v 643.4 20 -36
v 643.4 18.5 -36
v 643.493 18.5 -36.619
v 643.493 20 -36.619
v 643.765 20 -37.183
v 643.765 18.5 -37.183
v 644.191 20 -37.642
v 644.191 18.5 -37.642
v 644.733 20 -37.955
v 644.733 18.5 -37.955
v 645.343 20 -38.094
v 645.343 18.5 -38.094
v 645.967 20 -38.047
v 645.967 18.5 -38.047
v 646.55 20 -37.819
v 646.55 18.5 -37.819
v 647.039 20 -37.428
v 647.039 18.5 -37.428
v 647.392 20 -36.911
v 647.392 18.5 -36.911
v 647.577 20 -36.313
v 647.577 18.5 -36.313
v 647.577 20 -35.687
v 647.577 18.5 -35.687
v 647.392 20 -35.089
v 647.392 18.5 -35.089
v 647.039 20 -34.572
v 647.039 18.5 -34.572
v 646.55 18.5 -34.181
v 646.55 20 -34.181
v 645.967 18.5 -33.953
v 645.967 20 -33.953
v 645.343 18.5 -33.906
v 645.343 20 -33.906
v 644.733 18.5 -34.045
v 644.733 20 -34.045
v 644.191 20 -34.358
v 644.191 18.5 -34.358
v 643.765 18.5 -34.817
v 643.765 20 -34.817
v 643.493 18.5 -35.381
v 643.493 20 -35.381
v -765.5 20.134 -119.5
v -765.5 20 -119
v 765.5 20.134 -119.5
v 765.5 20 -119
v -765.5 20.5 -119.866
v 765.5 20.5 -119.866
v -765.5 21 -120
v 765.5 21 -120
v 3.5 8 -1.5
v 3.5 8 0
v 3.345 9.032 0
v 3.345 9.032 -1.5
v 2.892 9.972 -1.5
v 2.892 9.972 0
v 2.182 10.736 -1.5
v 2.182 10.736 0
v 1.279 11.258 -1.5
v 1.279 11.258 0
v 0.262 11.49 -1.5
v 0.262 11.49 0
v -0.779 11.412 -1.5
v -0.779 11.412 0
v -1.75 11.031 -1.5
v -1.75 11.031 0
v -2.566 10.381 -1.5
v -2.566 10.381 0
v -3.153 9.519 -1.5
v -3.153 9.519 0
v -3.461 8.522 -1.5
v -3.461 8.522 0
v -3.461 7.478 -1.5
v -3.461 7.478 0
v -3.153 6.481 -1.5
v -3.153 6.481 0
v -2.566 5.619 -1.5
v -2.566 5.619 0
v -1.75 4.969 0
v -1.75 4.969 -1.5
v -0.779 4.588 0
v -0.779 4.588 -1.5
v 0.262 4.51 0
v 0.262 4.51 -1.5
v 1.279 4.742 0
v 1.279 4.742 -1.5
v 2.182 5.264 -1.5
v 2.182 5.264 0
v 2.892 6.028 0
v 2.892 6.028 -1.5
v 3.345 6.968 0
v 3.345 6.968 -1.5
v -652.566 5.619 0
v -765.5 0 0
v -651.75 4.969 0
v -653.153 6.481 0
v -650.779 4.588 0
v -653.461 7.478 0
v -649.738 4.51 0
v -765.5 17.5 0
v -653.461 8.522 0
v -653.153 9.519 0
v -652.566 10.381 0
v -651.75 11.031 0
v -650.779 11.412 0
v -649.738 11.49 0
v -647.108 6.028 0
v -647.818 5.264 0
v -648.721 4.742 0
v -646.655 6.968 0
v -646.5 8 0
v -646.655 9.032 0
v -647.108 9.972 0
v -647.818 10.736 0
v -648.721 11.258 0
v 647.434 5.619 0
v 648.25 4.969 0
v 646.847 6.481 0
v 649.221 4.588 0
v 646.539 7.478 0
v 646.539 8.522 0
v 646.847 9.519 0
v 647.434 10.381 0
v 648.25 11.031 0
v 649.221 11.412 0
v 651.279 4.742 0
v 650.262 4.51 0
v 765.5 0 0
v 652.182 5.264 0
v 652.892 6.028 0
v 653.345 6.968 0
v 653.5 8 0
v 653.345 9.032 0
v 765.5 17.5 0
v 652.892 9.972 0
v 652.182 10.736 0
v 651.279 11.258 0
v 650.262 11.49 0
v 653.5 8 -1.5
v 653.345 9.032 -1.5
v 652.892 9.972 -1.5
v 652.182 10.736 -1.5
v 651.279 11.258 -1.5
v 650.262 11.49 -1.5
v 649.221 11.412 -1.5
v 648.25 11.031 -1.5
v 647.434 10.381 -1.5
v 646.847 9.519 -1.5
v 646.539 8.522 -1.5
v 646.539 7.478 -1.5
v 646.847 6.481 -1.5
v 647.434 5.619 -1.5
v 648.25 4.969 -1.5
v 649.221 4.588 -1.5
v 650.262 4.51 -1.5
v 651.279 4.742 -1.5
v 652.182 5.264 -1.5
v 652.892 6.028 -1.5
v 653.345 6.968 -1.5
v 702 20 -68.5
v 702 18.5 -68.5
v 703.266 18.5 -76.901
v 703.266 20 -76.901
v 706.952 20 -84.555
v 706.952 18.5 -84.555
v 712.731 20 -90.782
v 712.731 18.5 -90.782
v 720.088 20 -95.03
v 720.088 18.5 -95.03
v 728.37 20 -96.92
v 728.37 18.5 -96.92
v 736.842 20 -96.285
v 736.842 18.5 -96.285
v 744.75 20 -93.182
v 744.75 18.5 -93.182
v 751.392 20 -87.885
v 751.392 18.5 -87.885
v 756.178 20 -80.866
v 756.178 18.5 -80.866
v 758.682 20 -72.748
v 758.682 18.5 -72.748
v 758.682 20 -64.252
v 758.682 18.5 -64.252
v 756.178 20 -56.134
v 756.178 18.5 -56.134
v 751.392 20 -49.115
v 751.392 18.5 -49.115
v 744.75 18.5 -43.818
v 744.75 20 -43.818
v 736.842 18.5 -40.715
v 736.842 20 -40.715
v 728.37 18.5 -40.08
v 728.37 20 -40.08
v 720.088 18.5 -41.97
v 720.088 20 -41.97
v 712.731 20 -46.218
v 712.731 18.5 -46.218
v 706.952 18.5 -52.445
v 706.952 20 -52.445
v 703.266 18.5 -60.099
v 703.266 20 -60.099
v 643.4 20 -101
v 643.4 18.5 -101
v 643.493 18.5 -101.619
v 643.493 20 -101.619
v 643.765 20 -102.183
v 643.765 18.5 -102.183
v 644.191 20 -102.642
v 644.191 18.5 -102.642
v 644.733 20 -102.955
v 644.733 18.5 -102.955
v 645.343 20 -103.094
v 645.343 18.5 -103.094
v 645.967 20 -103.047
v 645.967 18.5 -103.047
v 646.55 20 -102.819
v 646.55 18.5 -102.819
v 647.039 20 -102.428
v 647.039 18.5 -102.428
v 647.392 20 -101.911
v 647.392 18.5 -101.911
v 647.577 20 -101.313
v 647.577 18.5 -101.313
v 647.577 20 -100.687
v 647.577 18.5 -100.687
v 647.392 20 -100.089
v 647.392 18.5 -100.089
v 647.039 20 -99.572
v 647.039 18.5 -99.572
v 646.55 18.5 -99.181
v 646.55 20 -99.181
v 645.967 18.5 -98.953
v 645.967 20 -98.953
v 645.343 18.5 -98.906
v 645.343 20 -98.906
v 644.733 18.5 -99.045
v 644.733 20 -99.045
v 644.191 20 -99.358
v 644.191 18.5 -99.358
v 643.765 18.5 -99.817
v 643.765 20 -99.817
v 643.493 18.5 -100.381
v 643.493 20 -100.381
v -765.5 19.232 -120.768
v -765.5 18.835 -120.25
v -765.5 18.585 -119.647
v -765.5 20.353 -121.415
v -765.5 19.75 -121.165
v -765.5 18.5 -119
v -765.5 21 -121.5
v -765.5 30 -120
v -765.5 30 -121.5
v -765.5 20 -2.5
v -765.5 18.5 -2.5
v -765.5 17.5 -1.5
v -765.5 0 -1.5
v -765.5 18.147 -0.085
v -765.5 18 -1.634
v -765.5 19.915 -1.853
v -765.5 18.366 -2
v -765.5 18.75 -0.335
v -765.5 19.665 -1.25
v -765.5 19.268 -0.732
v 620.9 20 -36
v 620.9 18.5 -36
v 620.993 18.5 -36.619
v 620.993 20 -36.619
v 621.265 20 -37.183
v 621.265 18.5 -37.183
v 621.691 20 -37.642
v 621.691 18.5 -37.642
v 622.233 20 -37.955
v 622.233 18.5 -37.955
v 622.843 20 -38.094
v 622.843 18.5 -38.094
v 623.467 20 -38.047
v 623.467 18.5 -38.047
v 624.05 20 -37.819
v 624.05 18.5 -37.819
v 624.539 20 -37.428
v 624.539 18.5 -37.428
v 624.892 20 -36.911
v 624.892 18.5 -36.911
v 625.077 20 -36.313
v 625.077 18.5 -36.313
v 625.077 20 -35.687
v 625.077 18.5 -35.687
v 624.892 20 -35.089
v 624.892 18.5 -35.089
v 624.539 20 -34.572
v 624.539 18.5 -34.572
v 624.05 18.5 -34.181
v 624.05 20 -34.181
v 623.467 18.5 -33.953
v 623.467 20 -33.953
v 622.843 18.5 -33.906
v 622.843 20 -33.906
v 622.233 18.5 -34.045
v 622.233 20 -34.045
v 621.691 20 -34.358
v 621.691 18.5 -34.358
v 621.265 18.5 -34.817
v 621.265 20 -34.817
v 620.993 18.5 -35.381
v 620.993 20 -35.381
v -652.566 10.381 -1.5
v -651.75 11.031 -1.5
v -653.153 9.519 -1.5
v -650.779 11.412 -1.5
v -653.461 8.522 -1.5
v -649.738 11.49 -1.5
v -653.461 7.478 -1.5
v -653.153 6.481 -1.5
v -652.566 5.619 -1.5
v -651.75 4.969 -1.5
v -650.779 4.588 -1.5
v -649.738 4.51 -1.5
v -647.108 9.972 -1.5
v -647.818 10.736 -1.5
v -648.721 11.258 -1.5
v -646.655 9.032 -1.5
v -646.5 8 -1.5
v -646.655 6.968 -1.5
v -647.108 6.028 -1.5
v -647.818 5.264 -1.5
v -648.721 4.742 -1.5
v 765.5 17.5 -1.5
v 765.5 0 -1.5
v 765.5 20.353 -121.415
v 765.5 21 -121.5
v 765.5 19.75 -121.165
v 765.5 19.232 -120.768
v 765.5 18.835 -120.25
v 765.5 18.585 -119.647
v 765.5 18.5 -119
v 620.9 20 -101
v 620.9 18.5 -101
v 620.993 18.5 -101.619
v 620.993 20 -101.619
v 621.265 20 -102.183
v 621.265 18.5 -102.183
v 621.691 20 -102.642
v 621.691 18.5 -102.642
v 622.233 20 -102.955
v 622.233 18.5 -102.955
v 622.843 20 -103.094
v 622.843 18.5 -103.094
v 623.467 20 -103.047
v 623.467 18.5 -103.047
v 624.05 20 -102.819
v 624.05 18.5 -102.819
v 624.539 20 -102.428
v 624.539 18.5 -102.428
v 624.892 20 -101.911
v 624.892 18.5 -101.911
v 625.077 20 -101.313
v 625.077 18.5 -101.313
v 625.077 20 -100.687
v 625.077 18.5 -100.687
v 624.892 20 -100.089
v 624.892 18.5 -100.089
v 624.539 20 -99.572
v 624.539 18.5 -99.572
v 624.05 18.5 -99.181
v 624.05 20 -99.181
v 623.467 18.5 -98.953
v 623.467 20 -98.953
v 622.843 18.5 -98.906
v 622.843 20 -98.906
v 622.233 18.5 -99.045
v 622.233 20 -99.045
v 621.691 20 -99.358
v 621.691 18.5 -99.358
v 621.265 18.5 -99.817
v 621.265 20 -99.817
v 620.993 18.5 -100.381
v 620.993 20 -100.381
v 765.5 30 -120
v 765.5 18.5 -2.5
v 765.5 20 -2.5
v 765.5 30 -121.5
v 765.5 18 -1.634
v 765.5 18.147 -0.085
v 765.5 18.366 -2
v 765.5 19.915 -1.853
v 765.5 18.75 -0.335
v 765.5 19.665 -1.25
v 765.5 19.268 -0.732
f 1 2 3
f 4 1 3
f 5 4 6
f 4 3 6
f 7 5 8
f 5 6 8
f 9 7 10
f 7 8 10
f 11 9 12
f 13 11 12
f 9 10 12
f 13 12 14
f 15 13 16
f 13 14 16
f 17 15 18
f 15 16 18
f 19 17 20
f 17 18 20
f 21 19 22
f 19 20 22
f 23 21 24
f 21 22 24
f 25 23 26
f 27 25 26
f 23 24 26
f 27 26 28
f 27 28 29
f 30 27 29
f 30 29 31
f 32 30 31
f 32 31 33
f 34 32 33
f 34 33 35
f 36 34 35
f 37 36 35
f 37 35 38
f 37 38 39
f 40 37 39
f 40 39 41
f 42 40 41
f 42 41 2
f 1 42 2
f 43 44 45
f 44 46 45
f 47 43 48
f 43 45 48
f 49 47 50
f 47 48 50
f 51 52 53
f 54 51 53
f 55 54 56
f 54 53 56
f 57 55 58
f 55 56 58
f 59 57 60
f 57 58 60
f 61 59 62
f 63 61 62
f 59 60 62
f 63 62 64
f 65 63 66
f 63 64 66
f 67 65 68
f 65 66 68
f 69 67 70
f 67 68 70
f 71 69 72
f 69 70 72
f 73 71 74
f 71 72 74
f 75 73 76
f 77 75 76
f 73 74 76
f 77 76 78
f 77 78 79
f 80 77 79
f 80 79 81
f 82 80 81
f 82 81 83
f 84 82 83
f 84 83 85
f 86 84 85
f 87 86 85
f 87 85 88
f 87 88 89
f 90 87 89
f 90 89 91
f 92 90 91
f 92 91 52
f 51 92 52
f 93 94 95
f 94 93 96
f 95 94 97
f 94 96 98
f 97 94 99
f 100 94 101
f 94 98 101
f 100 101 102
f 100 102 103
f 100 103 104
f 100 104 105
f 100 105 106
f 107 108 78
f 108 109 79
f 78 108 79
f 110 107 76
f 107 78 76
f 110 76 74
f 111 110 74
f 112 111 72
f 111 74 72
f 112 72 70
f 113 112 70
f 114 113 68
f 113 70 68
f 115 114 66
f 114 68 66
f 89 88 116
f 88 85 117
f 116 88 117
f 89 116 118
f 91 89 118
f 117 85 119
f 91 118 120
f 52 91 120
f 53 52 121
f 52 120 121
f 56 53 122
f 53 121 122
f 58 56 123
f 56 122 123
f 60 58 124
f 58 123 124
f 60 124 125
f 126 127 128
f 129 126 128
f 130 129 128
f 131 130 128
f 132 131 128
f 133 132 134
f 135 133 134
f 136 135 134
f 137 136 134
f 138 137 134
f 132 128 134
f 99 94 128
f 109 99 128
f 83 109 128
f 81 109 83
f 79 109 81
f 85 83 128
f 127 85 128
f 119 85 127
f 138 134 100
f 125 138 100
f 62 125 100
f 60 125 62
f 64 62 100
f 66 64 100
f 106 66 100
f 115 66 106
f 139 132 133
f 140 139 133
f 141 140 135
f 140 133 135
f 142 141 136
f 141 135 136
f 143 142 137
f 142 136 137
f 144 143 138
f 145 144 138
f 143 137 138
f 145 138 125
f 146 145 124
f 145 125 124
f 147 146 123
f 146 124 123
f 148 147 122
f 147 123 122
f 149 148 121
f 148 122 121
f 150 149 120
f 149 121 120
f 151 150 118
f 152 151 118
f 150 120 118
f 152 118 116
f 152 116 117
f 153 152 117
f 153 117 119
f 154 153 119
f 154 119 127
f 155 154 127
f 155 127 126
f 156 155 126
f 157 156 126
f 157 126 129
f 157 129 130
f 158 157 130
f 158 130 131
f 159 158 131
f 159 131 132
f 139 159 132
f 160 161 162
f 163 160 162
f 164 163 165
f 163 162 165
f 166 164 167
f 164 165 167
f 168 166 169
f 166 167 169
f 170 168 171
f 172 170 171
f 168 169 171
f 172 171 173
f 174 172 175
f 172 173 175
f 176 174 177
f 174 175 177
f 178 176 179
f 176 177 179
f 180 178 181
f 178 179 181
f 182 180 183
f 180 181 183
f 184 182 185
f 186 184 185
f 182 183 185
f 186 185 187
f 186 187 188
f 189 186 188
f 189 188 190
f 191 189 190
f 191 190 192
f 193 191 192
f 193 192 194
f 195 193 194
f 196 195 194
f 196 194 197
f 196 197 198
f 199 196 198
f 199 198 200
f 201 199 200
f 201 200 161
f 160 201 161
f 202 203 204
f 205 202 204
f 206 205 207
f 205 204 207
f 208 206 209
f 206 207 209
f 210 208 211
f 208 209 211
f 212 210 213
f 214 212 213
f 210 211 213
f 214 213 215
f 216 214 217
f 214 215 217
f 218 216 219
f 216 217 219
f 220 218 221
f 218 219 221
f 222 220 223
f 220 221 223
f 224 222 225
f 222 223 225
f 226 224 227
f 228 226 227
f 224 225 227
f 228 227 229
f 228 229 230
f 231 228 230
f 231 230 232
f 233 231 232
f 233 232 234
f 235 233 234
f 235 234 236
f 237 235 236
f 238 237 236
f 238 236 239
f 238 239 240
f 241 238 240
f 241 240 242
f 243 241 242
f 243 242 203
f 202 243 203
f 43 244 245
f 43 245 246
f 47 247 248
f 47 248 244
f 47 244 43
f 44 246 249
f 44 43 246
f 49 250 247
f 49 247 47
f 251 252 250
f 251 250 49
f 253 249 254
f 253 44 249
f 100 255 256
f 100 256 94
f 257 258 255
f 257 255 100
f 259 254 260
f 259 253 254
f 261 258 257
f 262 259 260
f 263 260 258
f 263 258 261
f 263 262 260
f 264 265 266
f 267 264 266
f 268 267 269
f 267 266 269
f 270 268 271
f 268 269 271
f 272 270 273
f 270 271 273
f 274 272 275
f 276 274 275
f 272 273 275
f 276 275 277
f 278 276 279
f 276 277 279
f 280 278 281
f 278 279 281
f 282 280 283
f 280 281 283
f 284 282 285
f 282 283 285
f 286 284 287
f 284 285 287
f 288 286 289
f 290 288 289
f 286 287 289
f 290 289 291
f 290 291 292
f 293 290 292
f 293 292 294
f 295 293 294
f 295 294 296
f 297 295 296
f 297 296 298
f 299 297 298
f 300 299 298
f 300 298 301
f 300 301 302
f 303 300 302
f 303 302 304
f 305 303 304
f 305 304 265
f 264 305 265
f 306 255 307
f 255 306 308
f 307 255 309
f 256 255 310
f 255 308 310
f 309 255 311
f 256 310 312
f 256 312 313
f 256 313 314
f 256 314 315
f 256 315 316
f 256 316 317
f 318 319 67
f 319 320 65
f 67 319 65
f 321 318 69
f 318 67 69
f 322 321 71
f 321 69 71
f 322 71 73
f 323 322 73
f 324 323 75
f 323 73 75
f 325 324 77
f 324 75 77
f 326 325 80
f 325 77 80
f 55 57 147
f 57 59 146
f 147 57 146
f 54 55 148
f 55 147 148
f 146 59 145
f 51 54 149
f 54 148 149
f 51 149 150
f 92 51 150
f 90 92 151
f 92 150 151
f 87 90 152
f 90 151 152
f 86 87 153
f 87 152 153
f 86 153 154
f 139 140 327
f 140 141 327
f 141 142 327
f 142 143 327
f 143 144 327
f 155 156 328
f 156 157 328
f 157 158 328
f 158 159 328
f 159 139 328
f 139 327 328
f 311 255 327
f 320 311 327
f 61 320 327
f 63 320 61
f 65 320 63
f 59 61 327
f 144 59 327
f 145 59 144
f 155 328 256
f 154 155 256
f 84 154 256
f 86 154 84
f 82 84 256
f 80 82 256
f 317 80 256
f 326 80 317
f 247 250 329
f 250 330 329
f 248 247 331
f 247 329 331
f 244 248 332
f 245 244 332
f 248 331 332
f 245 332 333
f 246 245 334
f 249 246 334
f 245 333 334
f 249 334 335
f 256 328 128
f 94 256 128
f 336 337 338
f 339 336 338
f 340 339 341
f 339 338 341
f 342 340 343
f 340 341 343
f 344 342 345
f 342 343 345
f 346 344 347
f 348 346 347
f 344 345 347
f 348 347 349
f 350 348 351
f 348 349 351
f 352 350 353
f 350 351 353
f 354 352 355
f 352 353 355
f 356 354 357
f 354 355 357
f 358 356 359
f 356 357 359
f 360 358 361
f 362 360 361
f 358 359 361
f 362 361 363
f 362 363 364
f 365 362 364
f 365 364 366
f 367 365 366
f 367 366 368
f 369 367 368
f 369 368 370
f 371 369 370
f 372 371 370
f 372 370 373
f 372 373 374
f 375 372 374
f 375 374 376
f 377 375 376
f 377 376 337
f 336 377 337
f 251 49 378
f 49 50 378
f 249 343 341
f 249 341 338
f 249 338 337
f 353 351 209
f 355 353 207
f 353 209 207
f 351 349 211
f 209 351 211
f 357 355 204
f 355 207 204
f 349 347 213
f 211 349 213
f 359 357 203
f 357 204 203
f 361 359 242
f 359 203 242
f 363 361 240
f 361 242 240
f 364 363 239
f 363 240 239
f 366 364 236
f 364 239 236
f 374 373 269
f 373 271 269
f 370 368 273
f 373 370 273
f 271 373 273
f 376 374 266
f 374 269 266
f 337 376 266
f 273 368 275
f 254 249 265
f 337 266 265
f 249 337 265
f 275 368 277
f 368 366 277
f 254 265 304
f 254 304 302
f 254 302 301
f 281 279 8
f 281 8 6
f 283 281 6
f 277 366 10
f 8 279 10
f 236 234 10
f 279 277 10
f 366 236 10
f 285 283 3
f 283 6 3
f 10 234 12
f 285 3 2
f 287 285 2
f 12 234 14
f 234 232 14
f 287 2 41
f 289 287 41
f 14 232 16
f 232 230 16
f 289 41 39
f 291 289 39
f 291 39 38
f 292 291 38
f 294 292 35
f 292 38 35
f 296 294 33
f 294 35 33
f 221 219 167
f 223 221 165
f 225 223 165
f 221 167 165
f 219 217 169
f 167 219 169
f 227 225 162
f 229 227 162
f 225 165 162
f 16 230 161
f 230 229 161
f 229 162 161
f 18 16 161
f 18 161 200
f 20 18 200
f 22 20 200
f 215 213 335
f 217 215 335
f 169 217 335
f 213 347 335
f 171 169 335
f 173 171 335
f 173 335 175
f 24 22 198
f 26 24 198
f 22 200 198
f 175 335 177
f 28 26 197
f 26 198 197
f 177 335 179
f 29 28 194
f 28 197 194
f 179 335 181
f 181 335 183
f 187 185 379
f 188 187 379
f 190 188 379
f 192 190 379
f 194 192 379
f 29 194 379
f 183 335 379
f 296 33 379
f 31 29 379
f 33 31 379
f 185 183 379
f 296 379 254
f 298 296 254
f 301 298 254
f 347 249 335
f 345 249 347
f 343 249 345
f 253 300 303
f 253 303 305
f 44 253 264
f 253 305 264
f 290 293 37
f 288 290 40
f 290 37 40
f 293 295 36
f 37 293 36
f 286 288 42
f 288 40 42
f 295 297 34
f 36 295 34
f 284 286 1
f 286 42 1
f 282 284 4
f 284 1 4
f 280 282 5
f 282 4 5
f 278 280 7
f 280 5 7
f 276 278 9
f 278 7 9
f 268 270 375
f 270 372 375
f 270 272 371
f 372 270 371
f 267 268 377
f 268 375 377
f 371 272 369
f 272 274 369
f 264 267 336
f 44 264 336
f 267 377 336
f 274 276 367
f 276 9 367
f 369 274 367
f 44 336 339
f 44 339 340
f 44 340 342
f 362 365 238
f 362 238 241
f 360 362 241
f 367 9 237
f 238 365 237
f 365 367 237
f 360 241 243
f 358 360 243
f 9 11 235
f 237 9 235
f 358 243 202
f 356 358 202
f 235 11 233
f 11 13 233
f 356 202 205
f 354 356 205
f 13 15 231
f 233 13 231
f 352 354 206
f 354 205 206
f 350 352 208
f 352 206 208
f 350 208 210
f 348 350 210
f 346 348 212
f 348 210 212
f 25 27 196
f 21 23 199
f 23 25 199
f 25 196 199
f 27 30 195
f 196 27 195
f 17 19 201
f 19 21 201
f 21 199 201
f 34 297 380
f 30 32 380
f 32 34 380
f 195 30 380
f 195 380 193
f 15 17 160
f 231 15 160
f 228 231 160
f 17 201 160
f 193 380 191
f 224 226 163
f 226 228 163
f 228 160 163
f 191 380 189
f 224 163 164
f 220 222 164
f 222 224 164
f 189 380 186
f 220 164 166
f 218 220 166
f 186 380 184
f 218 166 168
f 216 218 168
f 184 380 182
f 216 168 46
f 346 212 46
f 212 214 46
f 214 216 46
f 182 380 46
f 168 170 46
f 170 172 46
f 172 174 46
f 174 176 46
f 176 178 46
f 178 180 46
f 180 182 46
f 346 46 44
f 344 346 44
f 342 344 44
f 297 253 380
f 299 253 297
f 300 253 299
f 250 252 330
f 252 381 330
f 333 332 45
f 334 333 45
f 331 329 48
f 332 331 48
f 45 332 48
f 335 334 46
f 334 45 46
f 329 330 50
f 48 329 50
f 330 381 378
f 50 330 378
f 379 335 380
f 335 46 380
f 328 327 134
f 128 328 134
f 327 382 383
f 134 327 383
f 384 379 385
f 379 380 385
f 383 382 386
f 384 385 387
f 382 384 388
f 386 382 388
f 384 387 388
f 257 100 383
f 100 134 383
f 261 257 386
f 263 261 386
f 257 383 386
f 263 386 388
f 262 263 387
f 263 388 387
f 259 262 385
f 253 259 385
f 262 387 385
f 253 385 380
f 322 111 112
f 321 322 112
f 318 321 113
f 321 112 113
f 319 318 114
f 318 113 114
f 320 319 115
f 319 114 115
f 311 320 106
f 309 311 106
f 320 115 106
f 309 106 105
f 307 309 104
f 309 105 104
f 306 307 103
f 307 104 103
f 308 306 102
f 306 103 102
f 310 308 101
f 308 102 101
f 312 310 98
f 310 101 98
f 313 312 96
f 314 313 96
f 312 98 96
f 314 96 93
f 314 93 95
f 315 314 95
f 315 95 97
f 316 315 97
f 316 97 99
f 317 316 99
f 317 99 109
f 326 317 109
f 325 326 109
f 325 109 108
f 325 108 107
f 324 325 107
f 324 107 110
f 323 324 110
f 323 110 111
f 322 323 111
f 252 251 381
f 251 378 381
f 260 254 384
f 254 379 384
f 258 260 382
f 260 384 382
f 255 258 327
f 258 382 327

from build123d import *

# Parameters (mm, degrees)
SM_BASE_FLANGE_1_DEPTH = 765.5
HOLE_WIZARD_M6_1_D     = 7
HOLE_WIZARD_M5_1_D     = 4.2
HOLE_WIZARD_1_D        = 57


# Sheet-metal steps are written as plain solids
with BuildPart() as part:
    # Sketch 1 → 基体-法兰1 (new, symmetric)
    with BuildSketch(Plane(origin=(0, 0, 0), x_dir=(0, 0, -1), z_dir=(1, 0, 0))):
        with BuildLine():
            Line((0, 0), (0, 17.5))
            ThreePointArc((0, 17.5), (0.732233047, 19.267766953), (2.5, 20))
            Line((2.5, 20), (119, 20))
            ThreePointArc((119, 20), (119.707106781, 20.292893219), (120, 21))
            Line((120, 21), (120, 30))
            Line((120, 30), (121.5, 30))
            Line((121.5, 30), (121.5, 21))
            ThreePointArc((121.5, 21), (120.767766953, 19.232233047), (119, 18.5))
            Line((119, 18.5), (2.5, 18.5))
            ThreePointArc((2.5, 18.5), (1.792893219, 18.207106781), (1.5, 17.5))
            Line((1.5, 17.5), (1.5, 0))
            Line((1.5, 0), (0, 0))
        make_face()
    extrude(amount=SM_BASE_FLANGE_1_DEPTH, both=True)

    # M6 间隙孔1 (through all)
    with Locations(Plane(origin=(0, 0, -1.5), x_dir=(-1, 0, 0), z_dir=(0, 0, -1))):
        with Locations((-650, 8), (0, 8), (650, 8)):
            Hole(HOLE_WIZARD_M6_1_D / 2)

    # M5 螺纹孔1 (through all)
    with Locations(Plane(origin=(0, 20, 0), x_dir=(1, 0, 0), z_dir=(0, 1, 0))):
        with Locations((645.5, 36), (623, 36), (623, 101), (645.5, 101)):
            Hole(HOLE_WIZARD_M5_1_D / 2)

    # 孔1 (through all)
    with Locations(Plane(origin=(0, 20, 0), x_dir=(1, 0, 0), z_dir=(0, 1, 0))):
        with Locations((730.5, 68.5)):
            Hole(HOLE_WIZARD_1_D / 2)


solid = part.part
